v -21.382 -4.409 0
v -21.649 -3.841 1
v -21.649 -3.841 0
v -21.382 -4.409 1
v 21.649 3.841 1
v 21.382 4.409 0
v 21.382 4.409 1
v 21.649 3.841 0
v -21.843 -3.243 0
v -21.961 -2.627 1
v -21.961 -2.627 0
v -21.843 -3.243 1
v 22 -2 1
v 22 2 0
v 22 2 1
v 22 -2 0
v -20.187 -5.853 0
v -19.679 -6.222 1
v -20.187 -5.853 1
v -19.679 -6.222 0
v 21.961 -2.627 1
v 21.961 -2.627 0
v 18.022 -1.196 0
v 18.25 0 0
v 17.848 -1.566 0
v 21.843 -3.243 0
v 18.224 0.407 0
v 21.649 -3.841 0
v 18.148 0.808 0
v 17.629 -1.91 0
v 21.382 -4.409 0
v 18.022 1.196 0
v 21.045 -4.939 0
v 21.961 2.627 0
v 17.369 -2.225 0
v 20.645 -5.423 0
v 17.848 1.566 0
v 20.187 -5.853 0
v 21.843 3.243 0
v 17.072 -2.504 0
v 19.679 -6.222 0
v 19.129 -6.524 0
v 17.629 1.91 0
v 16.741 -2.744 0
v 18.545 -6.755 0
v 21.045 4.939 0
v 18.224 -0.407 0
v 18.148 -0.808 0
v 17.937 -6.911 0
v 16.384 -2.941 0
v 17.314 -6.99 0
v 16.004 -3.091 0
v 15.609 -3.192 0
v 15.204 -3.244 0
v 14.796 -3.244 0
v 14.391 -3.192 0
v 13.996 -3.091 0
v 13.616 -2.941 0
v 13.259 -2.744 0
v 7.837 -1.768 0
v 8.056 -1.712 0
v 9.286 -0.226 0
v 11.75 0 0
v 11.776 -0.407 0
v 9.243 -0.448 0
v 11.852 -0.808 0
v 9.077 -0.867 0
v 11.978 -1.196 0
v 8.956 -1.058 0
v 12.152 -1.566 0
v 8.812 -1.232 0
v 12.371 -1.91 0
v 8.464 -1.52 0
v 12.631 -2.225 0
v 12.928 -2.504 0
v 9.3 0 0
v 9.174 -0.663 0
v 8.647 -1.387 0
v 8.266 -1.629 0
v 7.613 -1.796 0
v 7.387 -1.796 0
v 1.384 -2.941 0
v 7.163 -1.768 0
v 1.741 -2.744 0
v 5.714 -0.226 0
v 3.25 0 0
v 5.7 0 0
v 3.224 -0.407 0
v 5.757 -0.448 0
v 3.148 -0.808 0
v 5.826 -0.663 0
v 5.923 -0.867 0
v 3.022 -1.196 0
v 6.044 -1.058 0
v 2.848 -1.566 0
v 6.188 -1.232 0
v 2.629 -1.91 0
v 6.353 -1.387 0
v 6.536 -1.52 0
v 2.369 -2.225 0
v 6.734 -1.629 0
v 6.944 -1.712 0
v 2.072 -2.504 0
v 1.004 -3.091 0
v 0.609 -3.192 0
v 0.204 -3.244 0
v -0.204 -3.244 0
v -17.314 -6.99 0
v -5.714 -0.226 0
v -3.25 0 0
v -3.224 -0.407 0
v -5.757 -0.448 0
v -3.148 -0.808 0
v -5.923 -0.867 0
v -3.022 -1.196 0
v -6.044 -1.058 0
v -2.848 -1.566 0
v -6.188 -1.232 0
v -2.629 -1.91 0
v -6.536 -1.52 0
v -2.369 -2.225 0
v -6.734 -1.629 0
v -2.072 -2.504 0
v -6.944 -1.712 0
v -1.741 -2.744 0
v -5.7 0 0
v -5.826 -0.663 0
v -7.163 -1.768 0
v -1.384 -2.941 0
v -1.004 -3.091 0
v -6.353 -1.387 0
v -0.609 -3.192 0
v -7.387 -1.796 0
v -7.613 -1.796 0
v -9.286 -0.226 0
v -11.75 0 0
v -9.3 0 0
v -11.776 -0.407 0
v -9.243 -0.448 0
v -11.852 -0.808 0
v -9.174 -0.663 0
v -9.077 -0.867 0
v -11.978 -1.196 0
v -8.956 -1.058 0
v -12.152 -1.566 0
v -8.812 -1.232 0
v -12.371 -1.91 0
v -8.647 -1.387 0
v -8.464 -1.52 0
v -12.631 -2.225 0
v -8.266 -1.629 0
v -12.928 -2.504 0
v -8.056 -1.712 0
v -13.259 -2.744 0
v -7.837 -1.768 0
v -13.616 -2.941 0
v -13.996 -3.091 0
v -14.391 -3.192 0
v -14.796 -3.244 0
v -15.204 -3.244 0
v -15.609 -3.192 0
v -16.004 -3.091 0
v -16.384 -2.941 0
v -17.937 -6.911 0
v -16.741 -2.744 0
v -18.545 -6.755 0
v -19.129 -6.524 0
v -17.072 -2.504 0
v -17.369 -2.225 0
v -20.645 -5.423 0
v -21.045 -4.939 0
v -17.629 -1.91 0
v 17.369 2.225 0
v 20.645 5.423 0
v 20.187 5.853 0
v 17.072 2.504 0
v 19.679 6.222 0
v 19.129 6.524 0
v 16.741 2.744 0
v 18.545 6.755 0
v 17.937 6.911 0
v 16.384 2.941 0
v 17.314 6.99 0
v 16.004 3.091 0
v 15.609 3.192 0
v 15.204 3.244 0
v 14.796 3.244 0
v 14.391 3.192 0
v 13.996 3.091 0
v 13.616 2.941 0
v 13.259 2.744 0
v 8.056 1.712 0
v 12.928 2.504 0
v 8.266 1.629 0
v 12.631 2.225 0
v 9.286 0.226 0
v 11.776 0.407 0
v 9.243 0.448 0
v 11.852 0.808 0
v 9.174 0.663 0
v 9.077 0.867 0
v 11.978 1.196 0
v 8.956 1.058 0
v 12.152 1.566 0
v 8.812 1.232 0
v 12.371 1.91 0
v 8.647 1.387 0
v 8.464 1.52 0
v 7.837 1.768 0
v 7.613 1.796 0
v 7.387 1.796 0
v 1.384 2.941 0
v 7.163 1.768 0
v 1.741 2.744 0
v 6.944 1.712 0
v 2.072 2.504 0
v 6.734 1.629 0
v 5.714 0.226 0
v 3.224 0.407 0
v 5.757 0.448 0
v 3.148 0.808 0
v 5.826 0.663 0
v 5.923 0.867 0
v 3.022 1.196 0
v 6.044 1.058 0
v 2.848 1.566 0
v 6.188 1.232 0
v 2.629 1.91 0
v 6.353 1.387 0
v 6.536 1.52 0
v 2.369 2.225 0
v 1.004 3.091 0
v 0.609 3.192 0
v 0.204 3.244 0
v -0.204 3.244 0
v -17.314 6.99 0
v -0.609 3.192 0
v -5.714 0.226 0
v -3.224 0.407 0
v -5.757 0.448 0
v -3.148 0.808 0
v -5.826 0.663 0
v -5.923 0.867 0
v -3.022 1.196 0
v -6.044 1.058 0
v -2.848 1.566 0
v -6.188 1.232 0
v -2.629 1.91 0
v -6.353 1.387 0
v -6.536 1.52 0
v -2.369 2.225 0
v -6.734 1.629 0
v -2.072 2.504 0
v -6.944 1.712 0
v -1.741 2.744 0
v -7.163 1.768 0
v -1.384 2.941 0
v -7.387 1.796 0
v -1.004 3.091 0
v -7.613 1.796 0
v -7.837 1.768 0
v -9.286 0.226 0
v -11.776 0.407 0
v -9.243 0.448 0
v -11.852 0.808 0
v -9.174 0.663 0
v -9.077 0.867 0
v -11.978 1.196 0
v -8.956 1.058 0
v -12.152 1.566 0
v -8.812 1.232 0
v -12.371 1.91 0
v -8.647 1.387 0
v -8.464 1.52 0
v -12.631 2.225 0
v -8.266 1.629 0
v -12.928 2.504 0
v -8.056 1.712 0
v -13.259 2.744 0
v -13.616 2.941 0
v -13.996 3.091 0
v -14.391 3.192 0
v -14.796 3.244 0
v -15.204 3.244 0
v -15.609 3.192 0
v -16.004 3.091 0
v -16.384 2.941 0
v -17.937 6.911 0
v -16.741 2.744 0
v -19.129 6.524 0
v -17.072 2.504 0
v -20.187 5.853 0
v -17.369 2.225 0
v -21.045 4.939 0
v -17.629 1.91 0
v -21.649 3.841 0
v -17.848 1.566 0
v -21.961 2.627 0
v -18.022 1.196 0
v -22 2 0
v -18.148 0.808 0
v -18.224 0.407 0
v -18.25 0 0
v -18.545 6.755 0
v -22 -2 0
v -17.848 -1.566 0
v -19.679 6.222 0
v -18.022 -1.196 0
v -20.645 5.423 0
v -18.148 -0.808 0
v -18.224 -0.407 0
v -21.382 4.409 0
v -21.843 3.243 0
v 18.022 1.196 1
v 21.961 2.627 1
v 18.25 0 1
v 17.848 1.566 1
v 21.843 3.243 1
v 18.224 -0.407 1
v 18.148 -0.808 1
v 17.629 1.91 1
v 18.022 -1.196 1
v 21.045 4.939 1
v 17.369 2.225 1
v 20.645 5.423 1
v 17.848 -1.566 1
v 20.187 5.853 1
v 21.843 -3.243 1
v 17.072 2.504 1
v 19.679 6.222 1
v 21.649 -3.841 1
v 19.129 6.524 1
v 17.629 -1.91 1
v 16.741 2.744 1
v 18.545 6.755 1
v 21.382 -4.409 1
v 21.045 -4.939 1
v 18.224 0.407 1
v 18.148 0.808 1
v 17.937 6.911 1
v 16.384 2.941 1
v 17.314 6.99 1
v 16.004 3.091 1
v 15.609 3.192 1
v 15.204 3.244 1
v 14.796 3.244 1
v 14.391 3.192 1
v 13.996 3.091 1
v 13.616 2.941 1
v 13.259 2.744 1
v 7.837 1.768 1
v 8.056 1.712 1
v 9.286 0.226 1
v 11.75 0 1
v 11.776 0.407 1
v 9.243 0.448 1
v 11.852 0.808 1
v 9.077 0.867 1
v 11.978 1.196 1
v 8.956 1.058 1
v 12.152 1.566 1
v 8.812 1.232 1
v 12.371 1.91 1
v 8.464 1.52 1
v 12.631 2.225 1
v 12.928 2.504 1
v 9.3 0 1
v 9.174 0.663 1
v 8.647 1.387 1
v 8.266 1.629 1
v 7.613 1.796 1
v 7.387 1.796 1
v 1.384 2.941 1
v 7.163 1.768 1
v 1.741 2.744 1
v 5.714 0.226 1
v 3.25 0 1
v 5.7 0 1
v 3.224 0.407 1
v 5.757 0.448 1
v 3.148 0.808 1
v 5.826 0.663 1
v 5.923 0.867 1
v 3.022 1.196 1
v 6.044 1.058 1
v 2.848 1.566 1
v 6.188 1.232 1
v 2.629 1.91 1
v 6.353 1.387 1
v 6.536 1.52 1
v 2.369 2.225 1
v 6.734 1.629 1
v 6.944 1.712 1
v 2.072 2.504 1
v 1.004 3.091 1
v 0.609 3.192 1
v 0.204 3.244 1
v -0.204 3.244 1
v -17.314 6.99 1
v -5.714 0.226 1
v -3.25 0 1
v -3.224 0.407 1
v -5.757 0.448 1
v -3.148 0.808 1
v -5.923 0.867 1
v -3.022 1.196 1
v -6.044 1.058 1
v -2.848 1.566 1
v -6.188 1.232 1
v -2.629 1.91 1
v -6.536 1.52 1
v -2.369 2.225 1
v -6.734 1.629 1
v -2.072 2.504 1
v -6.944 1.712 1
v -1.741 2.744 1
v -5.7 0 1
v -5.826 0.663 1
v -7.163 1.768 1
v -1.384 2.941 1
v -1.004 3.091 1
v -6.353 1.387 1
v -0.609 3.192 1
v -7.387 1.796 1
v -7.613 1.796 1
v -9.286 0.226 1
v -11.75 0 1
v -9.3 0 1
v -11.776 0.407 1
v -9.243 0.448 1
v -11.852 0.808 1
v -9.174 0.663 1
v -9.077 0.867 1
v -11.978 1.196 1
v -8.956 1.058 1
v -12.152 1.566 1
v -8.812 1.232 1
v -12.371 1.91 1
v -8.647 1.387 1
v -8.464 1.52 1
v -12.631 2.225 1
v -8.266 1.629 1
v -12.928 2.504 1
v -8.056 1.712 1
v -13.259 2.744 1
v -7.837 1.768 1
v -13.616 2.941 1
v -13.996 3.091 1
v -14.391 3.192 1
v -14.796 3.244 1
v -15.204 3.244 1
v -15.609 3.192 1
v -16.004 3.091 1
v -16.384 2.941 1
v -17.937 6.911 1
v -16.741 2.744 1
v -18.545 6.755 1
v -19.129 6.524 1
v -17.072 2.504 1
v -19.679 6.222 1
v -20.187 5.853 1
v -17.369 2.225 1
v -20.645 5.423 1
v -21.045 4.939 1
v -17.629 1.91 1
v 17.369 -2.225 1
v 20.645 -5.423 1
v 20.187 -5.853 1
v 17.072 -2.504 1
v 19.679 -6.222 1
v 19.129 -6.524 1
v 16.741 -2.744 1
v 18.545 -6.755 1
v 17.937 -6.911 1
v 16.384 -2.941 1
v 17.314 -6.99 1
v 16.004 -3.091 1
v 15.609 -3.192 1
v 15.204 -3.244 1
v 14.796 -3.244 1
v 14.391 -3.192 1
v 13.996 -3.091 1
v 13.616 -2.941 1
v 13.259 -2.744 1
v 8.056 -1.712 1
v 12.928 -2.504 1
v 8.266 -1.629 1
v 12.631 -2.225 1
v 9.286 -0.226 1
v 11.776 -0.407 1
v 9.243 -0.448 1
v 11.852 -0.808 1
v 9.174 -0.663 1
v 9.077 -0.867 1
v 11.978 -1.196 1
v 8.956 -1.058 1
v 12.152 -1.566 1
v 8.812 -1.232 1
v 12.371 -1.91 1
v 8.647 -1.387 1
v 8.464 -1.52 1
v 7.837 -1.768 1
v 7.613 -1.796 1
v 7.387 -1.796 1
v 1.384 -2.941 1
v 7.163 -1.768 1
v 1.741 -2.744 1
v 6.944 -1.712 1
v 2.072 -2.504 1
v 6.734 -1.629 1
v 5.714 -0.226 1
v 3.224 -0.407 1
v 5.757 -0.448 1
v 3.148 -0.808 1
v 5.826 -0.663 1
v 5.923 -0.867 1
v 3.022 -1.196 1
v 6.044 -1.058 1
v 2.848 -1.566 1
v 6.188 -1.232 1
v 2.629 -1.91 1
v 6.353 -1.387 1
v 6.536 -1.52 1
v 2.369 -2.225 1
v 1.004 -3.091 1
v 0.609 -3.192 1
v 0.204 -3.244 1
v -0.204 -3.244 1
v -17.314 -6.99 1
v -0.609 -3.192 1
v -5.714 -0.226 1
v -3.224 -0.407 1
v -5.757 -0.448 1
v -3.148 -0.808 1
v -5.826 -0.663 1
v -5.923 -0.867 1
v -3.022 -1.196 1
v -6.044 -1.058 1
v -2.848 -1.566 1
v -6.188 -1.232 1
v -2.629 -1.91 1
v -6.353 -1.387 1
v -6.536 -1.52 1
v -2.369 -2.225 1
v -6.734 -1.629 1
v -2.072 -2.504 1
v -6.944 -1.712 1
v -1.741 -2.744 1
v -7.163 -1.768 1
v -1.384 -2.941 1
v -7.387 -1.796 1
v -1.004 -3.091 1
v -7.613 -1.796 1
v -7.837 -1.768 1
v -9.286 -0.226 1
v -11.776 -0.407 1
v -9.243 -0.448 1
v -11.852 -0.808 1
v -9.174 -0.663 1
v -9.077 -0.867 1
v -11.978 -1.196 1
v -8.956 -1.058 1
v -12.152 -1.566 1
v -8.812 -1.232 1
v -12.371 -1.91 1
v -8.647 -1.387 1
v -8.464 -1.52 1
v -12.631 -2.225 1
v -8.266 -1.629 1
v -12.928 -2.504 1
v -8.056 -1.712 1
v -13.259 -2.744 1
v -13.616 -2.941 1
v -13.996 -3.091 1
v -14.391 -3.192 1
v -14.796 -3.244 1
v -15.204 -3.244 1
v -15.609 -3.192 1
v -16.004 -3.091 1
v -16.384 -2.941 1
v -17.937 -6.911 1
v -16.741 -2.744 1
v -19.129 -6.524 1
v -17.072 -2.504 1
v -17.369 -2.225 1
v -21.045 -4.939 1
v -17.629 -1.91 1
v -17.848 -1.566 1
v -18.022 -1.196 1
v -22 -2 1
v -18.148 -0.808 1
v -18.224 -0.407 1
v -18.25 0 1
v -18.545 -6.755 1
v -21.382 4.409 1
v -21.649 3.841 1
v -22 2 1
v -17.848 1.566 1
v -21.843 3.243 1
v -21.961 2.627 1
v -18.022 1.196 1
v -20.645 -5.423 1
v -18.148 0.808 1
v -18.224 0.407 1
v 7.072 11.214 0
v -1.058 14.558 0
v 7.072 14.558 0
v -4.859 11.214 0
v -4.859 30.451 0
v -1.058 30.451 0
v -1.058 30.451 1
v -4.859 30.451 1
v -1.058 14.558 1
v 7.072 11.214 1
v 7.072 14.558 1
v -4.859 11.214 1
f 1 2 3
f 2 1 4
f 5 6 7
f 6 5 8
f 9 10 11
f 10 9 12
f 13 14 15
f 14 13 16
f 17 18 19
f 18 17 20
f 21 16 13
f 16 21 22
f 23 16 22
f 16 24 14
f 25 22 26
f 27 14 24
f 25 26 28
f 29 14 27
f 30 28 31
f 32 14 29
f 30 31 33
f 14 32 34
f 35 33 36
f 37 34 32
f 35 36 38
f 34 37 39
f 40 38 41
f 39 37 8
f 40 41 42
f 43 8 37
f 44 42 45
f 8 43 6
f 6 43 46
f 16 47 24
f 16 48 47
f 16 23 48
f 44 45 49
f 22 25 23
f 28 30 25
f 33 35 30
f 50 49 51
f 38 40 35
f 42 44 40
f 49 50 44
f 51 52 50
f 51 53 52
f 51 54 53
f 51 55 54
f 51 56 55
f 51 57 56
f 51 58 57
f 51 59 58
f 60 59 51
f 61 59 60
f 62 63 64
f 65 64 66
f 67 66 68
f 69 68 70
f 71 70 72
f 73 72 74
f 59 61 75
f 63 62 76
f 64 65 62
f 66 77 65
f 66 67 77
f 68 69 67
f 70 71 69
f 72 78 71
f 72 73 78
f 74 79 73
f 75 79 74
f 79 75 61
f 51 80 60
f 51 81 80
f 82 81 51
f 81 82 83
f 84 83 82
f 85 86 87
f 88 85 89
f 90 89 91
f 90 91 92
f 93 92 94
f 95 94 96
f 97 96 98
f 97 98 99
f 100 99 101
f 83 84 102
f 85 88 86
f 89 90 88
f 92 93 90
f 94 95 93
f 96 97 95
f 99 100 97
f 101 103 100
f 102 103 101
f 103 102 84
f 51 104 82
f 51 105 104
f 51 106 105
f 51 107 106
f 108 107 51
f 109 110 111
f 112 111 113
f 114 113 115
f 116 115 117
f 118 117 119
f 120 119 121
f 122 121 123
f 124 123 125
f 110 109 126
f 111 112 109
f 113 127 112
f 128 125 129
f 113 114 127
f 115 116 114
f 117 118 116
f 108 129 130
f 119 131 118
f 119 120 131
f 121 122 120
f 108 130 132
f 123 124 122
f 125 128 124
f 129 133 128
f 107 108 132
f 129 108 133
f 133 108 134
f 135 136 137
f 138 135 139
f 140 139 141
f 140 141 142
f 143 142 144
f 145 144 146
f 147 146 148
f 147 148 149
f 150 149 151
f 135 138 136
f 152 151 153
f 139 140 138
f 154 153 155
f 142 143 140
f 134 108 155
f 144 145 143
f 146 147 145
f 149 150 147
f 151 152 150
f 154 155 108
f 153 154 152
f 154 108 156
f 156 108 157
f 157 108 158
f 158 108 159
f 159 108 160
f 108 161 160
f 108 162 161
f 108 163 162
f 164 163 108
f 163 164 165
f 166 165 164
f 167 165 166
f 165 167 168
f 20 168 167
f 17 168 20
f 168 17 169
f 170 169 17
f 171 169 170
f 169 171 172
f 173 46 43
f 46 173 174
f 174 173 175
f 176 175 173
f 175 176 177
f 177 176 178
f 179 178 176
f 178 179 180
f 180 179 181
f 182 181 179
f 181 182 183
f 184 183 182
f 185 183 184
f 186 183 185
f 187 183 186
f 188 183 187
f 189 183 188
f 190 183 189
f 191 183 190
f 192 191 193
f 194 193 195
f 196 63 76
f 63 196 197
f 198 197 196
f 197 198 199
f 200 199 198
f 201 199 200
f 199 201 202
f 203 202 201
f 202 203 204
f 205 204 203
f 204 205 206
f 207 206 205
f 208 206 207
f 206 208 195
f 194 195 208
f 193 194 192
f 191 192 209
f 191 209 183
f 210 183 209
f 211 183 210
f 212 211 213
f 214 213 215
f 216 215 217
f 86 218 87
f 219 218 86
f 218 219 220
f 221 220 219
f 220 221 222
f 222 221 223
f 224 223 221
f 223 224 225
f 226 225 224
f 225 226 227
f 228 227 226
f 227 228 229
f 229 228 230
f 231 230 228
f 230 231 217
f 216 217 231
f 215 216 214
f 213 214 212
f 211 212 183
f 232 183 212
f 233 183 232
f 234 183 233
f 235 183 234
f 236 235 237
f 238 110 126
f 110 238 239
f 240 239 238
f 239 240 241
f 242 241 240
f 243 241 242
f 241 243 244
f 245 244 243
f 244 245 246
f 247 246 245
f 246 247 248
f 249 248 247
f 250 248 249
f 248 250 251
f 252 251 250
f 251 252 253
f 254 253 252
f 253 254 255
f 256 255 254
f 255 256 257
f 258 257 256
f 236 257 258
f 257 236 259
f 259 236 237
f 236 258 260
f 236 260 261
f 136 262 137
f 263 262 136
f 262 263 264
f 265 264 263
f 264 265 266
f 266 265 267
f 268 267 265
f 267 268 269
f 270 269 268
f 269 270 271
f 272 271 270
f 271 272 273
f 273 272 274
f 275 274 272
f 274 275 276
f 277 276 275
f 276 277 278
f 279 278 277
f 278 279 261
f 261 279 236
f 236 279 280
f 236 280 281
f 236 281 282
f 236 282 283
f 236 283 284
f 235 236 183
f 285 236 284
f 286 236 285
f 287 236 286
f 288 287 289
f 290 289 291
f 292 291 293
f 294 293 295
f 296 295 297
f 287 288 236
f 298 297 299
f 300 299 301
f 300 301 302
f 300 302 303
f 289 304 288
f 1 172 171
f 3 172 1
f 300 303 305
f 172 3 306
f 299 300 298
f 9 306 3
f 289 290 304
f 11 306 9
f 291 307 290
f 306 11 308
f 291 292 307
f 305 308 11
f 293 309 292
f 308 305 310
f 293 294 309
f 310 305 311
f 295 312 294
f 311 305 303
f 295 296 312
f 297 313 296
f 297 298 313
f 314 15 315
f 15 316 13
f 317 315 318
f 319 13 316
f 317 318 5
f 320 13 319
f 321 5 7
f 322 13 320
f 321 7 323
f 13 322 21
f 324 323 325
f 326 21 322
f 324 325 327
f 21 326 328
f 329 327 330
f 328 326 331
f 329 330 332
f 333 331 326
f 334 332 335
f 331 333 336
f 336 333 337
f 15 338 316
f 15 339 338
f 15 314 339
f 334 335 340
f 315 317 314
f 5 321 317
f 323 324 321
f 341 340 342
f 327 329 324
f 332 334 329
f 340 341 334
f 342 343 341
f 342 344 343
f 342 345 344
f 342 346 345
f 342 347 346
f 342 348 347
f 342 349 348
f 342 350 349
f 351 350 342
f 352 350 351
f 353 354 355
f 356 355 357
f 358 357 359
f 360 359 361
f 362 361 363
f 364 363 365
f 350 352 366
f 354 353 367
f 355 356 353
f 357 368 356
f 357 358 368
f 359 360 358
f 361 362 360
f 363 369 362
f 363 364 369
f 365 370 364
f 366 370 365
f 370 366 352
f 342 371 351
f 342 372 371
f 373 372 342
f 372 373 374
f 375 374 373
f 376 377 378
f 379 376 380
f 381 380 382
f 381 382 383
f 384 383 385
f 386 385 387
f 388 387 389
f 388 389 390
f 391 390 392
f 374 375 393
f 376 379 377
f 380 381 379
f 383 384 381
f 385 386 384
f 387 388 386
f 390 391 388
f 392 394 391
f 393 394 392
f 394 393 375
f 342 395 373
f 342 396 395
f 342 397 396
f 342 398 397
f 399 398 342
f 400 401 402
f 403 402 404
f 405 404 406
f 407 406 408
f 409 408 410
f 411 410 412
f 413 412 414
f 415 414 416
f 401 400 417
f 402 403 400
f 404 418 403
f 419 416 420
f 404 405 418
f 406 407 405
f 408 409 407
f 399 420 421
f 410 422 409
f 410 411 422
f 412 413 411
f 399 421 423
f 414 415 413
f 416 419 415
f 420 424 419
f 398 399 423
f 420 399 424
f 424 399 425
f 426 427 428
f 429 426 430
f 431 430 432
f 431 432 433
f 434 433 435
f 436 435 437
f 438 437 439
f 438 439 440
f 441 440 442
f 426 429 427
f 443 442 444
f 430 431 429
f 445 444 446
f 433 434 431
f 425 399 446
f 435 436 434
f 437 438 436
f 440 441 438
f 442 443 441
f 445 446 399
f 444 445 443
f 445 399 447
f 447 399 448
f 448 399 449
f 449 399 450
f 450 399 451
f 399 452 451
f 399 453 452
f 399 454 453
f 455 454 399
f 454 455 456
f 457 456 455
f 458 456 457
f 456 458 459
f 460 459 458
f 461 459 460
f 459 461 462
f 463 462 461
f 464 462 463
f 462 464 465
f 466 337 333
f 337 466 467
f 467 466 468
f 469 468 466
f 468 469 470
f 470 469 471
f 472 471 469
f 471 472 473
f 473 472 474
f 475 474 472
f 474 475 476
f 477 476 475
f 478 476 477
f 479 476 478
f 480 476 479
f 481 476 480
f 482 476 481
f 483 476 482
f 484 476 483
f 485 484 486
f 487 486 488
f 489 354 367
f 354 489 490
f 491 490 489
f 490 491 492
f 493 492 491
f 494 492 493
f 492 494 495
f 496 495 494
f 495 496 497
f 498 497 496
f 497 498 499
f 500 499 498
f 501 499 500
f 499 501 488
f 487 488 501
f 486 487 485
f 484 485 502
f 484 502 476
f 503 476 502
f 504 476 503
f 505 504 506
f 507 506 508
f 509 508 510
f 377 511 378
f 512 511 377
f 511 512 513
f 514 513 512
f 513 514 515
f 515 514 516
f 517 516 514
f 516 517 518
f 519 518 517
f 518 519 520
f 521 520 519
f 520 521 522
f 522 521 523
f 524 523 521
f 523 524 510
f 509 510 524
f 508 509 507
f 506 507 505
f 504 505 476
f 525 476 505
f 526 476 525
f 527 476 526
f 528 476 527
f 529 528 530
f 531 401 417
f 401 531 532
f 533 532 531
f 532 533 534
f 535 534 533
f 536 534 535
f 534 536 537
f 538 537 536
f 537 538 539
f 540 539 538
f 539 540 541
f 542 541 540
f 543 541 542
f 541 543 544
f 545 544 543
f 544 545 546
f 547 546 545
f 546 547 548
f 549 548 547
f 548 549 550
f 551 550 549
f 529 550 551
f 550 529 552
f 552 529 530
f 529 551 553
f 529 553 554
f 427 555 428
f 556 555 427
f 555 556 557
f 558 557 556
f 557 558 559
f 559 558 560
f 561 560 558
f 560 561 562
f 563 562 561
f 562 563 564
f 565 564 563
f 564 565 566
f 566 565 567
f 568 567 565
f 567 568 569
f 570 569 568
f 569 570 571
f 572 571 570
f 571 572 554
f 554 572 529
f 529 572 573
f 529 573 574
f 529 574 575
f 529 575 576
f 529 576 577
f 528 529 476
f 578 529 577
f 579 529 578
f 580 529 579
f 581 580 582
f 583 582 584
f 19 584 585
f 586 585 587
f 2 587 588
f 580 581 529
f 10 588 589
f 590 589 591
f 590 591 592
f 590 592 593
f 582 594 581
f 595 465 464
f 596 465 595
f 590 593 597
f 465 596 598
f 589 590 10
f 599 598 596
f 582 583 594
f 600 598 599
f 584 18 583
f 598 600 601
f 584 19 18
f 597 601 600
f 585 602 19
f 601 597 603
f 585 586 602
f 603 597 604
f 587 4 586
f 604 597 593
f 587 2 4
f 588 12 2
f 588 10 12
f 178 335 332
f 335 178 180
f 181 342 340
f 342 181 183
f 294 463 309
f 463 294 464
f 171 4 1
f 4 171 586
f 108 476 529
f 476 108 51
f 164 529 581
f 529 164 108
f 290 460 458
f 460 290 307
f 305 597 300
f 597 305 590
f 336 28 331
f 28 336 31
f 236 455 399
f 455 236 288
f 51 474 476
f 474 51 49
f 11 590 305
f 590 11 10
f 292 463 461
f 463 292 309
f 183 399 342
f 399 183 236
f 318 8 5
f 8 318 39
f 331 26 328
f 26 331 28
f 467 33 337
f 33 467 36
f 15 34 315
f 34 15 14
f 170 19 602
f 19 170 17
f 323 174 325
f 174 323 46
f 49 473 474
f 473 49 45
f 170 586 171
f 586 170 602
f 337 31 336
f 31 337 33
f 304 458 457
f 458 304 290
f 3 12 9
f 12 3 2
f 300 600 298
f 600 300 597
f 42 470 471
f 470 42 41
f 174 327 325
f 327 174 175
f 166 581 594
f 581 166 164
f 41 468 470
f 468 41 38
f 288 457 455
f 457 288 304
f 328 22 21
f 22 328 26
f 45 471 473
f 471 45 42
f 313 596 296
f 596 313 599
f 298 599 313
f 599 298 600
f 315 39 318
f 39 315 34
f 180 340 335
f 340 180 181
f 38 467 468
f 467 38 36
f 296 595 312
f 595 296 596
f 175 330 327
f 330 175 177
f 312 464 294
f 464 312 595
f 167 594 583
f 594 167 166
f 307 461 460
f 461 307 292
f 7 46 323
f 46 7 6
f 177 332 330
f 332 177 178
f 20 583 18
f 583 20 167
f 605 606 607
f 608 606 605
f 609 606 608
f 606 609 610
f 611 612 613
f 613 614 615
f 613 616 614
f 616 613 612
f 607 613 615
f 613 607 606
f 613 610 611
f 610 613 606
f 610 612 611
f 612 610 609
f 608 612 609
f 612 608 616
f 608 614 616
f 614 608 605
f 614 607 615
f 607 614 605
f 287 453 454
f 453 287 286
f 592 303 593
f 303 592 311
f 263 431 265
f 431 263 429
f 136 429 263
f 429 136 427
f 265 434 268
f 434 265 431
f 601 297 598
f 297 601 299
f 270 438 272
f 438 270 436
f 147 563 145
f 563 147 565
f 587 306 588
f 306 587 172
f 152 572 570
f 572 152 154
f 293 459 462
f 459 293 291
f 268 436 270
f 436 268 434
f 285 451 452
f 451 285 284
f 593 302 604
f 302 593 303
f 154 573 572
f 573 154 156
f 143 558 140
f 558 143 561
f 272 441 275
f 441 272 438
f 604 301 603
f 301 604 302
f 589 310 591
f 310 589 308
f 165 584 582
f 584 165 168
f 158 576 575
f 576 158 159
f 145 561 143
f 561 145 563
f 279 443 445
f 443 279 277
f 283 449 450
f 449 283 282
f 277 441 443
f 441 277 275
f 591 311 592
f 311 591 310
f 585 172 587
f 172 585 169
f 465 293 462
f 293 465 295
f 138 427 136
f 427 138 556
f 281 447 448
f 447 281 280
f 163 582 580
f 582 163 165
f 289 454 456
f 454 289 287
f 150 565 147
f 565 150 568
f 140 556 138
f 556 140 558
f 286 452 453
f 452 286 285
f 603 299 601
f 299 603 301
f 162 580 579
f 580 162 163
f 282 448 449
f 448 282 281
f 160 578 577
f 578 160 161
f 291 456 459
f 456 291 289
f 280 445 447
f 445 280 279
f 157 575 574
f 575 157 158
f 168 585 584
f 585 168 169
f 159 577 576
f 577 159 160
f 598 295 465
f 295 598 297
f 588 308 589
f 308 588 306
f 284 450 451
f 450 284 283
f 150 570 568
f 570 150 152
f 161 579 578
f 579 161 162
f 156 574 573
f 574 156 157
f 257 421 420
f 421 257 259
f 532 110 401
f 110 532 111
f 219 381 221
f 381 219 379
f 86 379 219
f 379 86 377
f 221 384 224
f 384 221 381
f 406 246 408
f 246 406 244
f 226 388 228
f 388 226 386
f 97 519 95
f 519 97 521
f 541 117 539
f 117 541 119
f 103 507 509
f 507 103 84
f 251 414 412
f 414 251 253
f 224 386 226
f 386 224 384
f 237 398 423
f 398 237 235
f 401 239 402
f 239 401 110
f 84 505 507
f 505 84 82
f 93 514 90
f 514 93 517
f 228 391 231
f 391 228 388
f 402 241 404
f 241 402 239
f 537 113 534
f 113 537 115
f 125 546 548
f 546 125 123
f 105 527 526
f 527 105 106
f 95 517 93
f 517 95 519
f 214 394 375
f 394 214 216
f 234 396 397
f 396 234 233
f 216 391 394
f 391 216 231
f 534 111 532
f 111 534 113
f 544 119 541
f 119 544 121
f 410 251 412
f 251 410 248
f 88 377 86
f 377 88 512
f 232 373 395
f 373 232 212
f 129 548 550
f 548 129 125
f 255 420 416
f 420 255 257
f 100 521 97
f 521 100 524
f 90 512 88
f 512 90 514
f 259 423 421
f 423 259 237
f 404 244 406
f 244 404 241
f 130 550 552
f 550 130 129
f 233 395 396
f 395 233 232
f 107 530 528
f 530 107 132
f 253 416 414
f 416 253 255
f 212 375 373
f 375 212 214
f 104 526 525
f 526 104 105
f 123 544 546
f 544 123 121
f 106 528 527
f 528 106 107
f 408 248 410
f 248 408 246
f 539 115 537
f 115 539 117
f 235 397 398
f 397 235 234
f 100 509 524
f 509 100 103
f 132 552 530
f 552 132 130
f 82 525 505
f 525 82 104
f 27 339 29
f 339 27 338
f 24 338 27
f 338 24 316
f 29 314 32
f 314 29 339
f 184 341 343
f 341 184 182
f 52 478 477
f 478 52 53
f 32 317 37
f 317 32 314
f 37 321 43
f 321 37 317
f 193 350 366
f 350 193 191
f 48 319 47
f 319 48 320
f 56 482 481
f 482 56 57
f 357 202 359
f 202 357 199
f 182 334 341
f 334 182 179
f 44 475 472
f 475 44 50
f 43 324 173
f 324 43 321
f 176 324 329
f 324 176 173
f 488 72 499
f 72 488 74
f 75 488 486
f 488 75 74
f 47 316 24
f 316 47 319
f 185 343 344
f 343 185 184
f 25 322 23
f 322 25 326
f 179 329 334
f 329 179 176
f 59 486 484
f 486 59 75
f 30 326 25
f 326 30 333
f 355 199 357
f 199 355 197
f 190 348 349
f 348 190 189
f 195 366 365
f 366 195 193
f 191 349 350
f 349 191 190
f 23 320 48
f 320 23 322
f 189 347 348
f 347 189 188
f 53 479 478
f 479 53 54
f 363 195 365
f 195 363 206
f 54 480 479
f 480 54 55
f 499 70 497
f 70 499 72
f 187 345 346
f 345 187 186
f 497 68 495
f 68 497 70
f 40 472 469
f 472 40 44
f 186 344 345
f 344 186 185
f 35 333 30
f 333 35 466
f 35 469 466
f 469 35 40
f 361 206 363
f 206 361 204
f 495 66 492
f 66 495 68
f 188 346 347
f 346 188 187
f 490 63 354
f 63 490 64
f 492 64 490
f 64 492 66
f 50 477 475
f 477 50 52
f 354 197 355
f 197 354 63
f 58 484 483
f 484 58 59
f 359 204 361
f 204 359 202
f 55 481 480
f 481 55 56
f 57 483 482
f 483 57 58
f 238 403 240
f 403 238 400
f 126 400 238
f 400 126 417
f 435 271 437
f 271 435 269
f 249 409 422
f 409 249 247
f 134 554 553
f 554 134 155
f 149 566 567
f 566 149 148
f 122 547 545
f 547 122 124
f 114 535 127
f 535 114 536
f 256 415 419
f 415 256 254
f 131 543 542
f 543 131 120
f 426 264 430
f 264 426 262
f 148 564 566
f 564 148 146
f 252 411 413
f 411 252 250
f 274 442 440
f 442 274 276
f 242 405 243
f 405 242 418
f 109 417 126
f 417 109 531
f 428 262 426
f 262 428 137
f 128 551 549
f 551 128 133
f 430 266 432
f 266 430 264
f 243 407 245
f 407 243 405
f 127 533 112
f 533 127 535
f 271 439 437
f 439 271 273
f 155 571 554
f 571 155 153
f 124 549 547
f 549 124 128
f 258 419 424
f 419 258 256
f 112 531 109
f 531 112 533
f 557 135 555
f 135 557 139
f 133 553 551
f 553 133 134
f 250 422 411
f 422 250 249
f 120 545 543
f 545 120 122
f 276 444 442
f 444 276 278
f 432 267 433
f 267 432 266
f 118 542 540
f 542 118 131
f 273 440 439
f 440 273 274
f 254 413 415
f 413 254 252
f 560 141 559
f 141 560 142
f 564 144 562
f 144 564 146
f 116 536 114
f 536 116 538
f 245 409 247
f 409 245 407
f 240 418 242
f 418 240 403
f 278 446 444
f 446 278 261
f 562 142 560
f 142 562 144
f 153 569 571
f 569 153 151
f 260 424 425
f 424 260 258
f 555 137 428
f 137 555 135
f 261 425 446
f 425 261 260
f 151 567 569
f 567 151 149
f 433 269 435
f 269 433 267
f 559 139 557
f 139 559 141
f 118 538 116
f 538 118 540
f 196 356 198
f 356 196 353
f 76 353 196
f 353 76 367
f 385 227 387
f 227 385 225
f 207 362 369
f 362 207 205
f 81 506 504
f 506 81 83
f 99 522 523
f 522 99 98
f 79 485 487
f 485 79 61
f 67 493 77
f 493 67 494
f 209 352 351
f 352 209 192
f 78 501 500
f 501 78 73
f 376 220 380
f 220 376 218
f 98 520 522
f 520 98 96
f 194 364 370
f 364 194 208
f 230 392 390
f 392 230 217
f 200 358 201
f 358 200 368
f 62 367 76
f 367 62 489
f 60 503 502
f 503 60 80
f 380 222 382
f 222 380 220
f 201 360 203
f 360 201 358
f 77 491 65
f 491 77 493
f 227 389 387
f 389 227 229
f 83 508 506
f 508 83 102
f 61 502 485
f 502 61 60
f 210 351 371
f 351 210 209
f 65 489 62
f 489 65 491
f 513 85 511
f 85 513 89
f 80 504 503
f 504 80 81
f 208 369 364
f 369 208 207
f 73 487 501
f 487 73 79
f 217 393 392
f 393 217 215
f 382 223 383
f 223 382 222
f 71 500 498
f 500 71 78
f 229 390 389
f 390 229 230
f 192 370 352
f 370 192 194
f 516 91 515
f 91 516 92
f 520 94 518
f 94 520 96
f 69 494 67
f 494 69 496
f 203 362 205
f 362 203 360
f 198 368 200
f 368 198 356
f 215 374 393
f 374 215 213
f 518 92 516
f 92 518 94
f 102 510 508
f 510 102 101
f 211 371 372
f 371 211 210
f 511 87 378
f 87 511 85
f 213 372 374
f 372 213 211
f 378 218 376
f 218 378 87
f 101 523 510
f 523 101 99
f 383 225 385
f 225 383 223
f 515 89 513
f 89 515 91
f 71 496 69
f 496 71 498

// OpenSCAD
$fn = 50;


difference() {
	union() {
		hull() {
			translate(v = [-17.0000000000, 2.0000000000, 0]) {
				cylinder(h = 1, r = 5);
			}
			translate(v = [17.0000000000, 2.0000000000, 0]) {
				cylinder(h = 1, r = 5);
			}
			translate(v = [-17.0000000000, -2.0000000000, 0]) {
				cylinder(h = 1, r = 5);
			}
			translate(v = [17.0000000000, -2.0000000000, 0]) {
				cylinder(h = 1, r = 5);
			}
		}
		translate(v = [0, 30.0000000000, 0]) {
			linear_extrude(height = 1) {
				text(font = "DejaVu Sans Mono:style=Bold", halign = "center", size = 19.0000000000, text = "L", valign = "top");
			}
		}
	}
	union() {
		translate(v = [-15.0000000000, 0.0000000000, 0]) {
			translate(v = [0, 0, -100]) {
				cylinder(h = 200, r = 3.2500000000);
			}
		}
		translate(v = [0, 0, -100]) {
			cylinder(h = 200, r = 3.2500000000);
		}
		translate(v = [15.0000000000, 0.0000000000, 0]) {
			translate(v = [0, 0, -100]) {
				cylinder(h = 200, r = 3.2500000000);
			}
		}
		translate(v = [-15.0000000000, 0.0000000000, 0]) {
			translate(v = [0, 0, -100]) {
				cylinder(h = 200, r = 1.8000000000);
			}
		}
		translate(v = [-7.5000000000, 0.0000000000, 0]) {
			translate(v = [0, 0, -100]) {
				cylinder(h = 200, r = 1.8000000000);
			}
		}
		translate(v = [0, 0, -100]) {
			cylinder(h = 200, r = 1.8000000000);
		}
		translate(v = [7.5000000000, 0.0000000000, 0]) {
			translate(v = [0, 0, -100]) {
				cylinder(h = 200, r = 1.8000000000);
			}
		}
		translate(v = [15.0000000000, 0.0000000000, 0]) {
			translate(v = [0, 0, -100]) {
				cylinder(h = 200, r = 1.8000000000);
			}
		}
	}
}
